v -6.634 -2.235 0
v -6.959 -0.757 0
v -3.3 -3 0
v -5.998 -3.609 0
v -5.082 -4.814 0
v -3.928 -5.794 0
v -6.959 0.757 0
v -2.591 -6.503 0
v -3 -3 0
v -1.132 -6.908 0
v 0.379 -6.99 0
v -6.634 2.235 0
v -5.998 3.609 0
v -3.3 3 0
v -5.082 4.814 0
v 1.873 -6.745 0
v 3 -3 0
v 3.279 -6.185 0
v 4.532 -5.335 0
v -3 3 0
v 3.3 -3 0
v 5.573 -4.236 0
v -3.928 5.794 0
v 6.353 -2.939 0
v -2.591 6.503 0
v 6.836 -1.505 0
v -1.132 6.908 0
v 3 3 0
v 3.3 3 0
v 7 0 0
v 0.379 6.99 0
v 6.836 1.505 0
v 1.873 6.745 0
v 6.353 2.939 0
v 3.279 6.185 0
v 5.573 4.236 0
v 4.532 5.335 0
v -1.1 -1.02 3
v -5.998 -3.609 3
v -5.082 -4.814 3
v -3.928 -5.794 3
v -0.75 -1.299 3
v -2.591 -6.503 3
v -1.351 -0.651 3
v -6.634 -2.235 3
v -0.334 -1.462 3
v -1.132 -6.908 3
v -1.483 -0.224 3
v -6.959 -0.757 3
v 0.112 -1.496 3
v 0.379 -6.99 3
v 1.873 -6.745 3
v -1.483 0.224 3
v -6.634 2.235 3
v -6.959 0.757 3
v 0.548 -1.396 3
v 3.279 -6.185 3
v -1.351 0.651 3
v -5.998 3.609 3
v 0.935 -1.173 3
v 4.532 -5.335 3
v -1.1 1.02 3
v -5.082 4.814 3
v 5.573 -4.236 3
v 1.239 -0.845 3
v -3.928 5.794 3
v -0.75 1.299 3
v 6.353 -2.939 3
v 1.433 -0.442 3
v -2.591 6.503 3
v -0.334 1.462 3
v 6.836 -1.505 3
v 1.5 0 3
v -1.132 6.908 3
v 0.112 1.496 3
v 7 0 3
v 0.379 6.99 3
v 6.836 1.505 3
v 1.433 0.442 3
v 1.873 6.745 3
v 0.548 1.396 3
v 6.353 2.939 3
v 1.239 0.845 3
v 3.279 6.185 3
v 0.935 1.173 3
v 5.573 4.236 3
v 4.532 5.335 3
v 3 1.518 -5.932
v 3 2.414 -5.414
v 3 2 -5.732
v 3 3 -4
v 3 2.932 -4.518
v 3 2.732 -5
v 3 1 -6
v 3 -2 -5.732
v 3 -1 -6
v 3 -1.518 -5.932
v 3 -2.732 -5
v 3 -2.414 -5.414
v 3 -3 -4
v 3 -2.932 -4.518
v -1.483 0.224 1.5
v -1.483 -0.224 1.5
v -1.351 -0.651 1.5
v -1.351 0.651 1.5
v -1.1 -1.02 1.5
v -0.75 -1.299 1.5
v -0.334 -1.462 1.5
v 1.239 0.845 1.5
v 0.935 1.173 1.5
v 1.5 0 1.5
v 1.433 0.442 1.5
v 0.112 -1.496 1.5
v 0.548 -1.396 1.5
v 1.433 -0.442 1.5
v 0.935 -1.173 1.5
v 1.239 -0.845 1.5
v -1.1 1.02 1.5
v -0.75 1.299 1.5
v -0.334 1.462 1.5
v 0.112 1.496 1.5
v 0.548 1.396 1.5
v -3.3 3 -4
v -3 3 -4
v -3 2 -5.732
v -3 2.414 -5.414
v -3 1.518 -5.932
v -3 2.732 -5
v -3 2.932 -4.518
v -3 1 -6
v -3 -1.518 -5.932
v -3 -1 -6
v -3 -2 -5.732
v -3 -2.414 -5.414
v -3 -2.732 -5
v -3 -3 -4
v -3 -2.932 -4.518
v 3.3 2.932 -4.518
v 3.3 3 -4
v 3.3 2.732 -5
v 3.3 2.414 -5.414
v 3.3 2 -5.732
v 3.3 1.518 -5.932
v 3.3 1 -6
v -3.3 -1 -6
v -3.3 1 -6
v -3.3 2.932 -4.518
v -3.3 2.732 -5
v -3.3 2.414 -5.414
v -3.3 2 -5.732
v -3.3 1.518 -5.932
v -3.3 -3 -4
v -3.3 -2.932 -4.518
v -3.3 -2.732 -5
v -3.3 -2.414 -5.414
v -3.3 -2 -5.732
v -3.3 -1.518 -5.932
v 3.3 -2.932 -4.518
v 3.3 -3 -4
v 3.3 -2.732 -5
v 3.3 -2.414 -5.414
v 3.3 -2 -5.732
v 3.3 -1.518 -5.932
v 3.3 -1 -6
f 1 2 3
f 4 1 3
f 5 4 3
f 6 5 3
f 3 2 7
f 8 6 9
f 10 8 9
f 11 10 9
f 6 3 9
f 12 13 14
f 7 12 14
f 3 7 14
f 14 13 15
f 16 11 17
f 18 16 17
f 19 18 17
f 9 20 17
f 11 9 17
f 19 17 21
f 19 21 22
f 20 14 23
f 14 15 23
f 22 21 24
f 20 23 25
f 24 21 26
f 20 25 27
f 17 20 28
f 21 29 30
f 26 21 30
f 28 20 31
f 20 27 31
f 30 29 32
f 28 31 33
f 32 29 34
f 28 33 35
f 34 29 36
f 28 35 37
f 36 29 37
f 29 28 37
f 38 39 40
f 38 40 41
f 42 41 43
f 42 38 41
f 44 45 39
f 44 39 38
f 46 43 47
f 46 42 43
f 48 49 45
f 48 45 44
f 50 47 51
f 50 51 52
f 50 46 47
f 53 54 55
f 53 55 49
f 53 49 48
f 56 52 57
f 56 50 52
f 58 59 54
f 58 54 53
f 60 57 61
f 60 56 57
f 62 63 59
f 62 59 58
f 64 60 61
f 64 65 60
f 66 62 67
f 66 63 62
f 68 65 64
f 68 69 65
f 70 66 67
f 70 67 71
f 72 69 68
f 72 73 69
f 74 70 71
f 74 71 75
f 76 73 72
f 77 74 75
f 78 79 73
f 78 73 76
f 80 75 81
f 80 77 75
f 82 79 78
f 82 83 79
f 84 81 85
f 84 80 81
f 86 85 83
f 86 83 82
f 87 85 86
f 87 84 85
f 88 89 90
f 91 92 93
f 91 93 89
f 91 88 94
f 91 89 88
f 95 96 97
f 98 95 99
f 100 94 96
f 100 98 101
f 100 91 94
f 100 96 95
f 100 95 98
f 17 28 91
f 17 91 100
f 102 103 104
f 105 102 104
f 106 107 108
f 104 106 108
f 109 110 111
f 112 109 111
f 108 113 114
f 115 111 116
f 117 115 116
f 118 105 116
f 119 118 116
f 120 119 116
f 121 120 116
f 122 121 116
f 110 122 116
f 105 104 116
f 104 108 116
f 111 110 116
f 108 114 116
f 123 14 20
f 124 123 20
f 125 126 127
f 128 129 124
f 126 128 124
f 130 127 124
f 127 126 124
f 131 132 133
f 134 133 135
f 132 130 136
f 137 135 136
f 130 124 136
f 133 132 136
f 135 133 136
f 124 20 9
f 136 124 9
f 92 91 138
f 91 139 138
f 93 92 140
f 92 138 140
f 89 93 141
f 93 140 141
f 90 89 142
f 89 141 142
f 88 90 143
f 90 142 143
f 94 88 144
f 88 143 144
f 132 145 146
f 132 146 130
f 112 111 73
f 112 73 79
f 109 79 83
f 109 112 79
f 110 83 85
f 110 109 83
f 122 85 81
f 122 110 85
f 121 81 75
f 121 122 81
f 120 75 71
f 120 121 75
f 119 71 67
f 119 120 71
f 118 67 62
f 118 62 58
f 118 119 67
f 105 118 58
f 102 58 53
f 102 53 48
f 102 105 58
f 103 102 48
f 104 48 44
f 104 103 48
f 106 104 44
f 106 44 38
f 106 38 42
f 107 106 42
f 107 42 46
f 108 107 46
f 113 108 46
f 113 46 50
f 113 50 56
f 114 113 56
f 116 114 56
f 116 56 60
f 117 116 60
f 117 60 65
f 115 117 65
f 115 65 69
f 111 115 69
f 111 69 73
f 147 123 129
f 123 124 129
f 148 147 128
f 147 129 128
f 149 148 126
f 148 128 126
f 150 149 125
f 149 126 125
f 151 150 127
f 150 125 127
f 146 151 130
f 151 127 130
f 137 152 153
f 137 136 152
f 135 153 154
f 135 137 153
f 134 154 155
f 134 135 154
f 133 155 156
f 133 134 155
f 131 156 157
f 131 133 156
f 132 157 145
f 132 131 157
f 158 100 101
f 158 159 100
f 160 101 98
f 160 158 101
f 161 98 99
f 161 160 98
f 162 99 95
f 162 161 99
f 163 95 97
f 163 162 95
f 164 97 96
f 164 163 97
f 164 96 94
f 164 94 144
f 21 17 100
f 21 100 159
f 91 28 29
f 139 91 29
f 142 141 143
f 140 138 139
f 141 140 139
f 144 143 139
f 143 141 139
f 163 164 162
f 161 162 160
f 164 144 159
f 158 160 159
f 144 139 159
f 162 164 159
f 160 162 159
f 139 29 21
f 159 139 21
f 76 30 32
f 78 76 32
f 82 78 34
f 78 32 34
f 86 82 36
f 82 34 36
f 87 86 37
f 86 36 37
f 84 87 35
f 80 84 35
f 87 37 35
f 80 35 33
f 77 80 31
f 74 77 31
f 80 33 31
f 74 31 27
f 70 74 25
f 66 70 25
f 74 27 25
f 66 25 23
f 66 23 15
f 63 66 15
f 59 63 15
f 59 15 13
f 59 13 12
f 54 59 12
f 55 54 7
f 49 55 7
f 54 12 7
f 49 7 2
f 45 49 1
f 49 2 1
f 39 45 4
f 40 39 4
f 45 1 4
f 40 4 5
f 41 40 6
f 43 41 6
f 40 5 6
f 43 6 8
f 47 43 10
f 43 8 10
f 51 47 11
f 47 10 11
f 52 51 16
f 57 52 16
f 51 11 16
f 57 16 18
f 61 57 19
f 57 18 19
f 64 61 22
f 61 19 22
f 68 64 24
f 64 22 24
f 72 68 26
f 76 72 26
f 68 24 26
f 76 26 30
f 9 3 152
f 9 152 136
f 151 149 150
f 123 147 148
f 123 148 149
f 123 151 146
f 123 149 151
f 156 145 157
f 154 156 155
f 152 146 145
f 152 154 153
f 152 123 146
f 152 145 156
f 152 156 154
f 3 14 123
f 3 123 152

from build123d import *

# Parameters (mm, degrees)
F0_R     = 7
F0_R_2   = 1.5
F1_DEPTH = 3
F2_R     = 1.551902
F3_DEPTH = 1.5
F4_W     = 0.3
F4_H     = 6
F5_DEPTH = 6
F6_R     = 2


with BuildPart() as f1:
    # F0 (on Top) → F1 (new body)
    with BuildSketch(Plane.XY):
        Circle(F0_R)
        Circle(F0_R_2, mode=Mode.SUBTRACT)
    extrude(amount=F1_DEPTH)

    # F2 (on face) → F3 (join)
    with BuildSketch(Plane(origin=(0, 0, 0), x_dir=(1, 0, 0), z_dir=(0, 0, -1))):
        Circle(F2_R)
    extrude(amount=-F3_DEPTH)

    # F4 (on face) → F5 (join)
    with BuildSketch(Plane(origin=(0, 0, 0), x_dir=(1, 0, 0), z_dir=(0, 0, -1))):
        with Locations((-3.15, 0)):
            Rectangle(F4_W, F4_H)
        with Locations((3.15, 0)):
            Rectangle(F4_W, F4_H)
    extrude(amount=F5_DEPTH)

    # F6
    f6_edges = [f1.edges().sort_by_distance(p)[0] for p in [
        (-3.15, -3, -6),
        (-3.15, 3, -6),
        (3.15, 3, -6),
        (3.15, -3, -6),
    ]]
    fillet(f6_edges, radius=F6_R)


solid = f1.part
